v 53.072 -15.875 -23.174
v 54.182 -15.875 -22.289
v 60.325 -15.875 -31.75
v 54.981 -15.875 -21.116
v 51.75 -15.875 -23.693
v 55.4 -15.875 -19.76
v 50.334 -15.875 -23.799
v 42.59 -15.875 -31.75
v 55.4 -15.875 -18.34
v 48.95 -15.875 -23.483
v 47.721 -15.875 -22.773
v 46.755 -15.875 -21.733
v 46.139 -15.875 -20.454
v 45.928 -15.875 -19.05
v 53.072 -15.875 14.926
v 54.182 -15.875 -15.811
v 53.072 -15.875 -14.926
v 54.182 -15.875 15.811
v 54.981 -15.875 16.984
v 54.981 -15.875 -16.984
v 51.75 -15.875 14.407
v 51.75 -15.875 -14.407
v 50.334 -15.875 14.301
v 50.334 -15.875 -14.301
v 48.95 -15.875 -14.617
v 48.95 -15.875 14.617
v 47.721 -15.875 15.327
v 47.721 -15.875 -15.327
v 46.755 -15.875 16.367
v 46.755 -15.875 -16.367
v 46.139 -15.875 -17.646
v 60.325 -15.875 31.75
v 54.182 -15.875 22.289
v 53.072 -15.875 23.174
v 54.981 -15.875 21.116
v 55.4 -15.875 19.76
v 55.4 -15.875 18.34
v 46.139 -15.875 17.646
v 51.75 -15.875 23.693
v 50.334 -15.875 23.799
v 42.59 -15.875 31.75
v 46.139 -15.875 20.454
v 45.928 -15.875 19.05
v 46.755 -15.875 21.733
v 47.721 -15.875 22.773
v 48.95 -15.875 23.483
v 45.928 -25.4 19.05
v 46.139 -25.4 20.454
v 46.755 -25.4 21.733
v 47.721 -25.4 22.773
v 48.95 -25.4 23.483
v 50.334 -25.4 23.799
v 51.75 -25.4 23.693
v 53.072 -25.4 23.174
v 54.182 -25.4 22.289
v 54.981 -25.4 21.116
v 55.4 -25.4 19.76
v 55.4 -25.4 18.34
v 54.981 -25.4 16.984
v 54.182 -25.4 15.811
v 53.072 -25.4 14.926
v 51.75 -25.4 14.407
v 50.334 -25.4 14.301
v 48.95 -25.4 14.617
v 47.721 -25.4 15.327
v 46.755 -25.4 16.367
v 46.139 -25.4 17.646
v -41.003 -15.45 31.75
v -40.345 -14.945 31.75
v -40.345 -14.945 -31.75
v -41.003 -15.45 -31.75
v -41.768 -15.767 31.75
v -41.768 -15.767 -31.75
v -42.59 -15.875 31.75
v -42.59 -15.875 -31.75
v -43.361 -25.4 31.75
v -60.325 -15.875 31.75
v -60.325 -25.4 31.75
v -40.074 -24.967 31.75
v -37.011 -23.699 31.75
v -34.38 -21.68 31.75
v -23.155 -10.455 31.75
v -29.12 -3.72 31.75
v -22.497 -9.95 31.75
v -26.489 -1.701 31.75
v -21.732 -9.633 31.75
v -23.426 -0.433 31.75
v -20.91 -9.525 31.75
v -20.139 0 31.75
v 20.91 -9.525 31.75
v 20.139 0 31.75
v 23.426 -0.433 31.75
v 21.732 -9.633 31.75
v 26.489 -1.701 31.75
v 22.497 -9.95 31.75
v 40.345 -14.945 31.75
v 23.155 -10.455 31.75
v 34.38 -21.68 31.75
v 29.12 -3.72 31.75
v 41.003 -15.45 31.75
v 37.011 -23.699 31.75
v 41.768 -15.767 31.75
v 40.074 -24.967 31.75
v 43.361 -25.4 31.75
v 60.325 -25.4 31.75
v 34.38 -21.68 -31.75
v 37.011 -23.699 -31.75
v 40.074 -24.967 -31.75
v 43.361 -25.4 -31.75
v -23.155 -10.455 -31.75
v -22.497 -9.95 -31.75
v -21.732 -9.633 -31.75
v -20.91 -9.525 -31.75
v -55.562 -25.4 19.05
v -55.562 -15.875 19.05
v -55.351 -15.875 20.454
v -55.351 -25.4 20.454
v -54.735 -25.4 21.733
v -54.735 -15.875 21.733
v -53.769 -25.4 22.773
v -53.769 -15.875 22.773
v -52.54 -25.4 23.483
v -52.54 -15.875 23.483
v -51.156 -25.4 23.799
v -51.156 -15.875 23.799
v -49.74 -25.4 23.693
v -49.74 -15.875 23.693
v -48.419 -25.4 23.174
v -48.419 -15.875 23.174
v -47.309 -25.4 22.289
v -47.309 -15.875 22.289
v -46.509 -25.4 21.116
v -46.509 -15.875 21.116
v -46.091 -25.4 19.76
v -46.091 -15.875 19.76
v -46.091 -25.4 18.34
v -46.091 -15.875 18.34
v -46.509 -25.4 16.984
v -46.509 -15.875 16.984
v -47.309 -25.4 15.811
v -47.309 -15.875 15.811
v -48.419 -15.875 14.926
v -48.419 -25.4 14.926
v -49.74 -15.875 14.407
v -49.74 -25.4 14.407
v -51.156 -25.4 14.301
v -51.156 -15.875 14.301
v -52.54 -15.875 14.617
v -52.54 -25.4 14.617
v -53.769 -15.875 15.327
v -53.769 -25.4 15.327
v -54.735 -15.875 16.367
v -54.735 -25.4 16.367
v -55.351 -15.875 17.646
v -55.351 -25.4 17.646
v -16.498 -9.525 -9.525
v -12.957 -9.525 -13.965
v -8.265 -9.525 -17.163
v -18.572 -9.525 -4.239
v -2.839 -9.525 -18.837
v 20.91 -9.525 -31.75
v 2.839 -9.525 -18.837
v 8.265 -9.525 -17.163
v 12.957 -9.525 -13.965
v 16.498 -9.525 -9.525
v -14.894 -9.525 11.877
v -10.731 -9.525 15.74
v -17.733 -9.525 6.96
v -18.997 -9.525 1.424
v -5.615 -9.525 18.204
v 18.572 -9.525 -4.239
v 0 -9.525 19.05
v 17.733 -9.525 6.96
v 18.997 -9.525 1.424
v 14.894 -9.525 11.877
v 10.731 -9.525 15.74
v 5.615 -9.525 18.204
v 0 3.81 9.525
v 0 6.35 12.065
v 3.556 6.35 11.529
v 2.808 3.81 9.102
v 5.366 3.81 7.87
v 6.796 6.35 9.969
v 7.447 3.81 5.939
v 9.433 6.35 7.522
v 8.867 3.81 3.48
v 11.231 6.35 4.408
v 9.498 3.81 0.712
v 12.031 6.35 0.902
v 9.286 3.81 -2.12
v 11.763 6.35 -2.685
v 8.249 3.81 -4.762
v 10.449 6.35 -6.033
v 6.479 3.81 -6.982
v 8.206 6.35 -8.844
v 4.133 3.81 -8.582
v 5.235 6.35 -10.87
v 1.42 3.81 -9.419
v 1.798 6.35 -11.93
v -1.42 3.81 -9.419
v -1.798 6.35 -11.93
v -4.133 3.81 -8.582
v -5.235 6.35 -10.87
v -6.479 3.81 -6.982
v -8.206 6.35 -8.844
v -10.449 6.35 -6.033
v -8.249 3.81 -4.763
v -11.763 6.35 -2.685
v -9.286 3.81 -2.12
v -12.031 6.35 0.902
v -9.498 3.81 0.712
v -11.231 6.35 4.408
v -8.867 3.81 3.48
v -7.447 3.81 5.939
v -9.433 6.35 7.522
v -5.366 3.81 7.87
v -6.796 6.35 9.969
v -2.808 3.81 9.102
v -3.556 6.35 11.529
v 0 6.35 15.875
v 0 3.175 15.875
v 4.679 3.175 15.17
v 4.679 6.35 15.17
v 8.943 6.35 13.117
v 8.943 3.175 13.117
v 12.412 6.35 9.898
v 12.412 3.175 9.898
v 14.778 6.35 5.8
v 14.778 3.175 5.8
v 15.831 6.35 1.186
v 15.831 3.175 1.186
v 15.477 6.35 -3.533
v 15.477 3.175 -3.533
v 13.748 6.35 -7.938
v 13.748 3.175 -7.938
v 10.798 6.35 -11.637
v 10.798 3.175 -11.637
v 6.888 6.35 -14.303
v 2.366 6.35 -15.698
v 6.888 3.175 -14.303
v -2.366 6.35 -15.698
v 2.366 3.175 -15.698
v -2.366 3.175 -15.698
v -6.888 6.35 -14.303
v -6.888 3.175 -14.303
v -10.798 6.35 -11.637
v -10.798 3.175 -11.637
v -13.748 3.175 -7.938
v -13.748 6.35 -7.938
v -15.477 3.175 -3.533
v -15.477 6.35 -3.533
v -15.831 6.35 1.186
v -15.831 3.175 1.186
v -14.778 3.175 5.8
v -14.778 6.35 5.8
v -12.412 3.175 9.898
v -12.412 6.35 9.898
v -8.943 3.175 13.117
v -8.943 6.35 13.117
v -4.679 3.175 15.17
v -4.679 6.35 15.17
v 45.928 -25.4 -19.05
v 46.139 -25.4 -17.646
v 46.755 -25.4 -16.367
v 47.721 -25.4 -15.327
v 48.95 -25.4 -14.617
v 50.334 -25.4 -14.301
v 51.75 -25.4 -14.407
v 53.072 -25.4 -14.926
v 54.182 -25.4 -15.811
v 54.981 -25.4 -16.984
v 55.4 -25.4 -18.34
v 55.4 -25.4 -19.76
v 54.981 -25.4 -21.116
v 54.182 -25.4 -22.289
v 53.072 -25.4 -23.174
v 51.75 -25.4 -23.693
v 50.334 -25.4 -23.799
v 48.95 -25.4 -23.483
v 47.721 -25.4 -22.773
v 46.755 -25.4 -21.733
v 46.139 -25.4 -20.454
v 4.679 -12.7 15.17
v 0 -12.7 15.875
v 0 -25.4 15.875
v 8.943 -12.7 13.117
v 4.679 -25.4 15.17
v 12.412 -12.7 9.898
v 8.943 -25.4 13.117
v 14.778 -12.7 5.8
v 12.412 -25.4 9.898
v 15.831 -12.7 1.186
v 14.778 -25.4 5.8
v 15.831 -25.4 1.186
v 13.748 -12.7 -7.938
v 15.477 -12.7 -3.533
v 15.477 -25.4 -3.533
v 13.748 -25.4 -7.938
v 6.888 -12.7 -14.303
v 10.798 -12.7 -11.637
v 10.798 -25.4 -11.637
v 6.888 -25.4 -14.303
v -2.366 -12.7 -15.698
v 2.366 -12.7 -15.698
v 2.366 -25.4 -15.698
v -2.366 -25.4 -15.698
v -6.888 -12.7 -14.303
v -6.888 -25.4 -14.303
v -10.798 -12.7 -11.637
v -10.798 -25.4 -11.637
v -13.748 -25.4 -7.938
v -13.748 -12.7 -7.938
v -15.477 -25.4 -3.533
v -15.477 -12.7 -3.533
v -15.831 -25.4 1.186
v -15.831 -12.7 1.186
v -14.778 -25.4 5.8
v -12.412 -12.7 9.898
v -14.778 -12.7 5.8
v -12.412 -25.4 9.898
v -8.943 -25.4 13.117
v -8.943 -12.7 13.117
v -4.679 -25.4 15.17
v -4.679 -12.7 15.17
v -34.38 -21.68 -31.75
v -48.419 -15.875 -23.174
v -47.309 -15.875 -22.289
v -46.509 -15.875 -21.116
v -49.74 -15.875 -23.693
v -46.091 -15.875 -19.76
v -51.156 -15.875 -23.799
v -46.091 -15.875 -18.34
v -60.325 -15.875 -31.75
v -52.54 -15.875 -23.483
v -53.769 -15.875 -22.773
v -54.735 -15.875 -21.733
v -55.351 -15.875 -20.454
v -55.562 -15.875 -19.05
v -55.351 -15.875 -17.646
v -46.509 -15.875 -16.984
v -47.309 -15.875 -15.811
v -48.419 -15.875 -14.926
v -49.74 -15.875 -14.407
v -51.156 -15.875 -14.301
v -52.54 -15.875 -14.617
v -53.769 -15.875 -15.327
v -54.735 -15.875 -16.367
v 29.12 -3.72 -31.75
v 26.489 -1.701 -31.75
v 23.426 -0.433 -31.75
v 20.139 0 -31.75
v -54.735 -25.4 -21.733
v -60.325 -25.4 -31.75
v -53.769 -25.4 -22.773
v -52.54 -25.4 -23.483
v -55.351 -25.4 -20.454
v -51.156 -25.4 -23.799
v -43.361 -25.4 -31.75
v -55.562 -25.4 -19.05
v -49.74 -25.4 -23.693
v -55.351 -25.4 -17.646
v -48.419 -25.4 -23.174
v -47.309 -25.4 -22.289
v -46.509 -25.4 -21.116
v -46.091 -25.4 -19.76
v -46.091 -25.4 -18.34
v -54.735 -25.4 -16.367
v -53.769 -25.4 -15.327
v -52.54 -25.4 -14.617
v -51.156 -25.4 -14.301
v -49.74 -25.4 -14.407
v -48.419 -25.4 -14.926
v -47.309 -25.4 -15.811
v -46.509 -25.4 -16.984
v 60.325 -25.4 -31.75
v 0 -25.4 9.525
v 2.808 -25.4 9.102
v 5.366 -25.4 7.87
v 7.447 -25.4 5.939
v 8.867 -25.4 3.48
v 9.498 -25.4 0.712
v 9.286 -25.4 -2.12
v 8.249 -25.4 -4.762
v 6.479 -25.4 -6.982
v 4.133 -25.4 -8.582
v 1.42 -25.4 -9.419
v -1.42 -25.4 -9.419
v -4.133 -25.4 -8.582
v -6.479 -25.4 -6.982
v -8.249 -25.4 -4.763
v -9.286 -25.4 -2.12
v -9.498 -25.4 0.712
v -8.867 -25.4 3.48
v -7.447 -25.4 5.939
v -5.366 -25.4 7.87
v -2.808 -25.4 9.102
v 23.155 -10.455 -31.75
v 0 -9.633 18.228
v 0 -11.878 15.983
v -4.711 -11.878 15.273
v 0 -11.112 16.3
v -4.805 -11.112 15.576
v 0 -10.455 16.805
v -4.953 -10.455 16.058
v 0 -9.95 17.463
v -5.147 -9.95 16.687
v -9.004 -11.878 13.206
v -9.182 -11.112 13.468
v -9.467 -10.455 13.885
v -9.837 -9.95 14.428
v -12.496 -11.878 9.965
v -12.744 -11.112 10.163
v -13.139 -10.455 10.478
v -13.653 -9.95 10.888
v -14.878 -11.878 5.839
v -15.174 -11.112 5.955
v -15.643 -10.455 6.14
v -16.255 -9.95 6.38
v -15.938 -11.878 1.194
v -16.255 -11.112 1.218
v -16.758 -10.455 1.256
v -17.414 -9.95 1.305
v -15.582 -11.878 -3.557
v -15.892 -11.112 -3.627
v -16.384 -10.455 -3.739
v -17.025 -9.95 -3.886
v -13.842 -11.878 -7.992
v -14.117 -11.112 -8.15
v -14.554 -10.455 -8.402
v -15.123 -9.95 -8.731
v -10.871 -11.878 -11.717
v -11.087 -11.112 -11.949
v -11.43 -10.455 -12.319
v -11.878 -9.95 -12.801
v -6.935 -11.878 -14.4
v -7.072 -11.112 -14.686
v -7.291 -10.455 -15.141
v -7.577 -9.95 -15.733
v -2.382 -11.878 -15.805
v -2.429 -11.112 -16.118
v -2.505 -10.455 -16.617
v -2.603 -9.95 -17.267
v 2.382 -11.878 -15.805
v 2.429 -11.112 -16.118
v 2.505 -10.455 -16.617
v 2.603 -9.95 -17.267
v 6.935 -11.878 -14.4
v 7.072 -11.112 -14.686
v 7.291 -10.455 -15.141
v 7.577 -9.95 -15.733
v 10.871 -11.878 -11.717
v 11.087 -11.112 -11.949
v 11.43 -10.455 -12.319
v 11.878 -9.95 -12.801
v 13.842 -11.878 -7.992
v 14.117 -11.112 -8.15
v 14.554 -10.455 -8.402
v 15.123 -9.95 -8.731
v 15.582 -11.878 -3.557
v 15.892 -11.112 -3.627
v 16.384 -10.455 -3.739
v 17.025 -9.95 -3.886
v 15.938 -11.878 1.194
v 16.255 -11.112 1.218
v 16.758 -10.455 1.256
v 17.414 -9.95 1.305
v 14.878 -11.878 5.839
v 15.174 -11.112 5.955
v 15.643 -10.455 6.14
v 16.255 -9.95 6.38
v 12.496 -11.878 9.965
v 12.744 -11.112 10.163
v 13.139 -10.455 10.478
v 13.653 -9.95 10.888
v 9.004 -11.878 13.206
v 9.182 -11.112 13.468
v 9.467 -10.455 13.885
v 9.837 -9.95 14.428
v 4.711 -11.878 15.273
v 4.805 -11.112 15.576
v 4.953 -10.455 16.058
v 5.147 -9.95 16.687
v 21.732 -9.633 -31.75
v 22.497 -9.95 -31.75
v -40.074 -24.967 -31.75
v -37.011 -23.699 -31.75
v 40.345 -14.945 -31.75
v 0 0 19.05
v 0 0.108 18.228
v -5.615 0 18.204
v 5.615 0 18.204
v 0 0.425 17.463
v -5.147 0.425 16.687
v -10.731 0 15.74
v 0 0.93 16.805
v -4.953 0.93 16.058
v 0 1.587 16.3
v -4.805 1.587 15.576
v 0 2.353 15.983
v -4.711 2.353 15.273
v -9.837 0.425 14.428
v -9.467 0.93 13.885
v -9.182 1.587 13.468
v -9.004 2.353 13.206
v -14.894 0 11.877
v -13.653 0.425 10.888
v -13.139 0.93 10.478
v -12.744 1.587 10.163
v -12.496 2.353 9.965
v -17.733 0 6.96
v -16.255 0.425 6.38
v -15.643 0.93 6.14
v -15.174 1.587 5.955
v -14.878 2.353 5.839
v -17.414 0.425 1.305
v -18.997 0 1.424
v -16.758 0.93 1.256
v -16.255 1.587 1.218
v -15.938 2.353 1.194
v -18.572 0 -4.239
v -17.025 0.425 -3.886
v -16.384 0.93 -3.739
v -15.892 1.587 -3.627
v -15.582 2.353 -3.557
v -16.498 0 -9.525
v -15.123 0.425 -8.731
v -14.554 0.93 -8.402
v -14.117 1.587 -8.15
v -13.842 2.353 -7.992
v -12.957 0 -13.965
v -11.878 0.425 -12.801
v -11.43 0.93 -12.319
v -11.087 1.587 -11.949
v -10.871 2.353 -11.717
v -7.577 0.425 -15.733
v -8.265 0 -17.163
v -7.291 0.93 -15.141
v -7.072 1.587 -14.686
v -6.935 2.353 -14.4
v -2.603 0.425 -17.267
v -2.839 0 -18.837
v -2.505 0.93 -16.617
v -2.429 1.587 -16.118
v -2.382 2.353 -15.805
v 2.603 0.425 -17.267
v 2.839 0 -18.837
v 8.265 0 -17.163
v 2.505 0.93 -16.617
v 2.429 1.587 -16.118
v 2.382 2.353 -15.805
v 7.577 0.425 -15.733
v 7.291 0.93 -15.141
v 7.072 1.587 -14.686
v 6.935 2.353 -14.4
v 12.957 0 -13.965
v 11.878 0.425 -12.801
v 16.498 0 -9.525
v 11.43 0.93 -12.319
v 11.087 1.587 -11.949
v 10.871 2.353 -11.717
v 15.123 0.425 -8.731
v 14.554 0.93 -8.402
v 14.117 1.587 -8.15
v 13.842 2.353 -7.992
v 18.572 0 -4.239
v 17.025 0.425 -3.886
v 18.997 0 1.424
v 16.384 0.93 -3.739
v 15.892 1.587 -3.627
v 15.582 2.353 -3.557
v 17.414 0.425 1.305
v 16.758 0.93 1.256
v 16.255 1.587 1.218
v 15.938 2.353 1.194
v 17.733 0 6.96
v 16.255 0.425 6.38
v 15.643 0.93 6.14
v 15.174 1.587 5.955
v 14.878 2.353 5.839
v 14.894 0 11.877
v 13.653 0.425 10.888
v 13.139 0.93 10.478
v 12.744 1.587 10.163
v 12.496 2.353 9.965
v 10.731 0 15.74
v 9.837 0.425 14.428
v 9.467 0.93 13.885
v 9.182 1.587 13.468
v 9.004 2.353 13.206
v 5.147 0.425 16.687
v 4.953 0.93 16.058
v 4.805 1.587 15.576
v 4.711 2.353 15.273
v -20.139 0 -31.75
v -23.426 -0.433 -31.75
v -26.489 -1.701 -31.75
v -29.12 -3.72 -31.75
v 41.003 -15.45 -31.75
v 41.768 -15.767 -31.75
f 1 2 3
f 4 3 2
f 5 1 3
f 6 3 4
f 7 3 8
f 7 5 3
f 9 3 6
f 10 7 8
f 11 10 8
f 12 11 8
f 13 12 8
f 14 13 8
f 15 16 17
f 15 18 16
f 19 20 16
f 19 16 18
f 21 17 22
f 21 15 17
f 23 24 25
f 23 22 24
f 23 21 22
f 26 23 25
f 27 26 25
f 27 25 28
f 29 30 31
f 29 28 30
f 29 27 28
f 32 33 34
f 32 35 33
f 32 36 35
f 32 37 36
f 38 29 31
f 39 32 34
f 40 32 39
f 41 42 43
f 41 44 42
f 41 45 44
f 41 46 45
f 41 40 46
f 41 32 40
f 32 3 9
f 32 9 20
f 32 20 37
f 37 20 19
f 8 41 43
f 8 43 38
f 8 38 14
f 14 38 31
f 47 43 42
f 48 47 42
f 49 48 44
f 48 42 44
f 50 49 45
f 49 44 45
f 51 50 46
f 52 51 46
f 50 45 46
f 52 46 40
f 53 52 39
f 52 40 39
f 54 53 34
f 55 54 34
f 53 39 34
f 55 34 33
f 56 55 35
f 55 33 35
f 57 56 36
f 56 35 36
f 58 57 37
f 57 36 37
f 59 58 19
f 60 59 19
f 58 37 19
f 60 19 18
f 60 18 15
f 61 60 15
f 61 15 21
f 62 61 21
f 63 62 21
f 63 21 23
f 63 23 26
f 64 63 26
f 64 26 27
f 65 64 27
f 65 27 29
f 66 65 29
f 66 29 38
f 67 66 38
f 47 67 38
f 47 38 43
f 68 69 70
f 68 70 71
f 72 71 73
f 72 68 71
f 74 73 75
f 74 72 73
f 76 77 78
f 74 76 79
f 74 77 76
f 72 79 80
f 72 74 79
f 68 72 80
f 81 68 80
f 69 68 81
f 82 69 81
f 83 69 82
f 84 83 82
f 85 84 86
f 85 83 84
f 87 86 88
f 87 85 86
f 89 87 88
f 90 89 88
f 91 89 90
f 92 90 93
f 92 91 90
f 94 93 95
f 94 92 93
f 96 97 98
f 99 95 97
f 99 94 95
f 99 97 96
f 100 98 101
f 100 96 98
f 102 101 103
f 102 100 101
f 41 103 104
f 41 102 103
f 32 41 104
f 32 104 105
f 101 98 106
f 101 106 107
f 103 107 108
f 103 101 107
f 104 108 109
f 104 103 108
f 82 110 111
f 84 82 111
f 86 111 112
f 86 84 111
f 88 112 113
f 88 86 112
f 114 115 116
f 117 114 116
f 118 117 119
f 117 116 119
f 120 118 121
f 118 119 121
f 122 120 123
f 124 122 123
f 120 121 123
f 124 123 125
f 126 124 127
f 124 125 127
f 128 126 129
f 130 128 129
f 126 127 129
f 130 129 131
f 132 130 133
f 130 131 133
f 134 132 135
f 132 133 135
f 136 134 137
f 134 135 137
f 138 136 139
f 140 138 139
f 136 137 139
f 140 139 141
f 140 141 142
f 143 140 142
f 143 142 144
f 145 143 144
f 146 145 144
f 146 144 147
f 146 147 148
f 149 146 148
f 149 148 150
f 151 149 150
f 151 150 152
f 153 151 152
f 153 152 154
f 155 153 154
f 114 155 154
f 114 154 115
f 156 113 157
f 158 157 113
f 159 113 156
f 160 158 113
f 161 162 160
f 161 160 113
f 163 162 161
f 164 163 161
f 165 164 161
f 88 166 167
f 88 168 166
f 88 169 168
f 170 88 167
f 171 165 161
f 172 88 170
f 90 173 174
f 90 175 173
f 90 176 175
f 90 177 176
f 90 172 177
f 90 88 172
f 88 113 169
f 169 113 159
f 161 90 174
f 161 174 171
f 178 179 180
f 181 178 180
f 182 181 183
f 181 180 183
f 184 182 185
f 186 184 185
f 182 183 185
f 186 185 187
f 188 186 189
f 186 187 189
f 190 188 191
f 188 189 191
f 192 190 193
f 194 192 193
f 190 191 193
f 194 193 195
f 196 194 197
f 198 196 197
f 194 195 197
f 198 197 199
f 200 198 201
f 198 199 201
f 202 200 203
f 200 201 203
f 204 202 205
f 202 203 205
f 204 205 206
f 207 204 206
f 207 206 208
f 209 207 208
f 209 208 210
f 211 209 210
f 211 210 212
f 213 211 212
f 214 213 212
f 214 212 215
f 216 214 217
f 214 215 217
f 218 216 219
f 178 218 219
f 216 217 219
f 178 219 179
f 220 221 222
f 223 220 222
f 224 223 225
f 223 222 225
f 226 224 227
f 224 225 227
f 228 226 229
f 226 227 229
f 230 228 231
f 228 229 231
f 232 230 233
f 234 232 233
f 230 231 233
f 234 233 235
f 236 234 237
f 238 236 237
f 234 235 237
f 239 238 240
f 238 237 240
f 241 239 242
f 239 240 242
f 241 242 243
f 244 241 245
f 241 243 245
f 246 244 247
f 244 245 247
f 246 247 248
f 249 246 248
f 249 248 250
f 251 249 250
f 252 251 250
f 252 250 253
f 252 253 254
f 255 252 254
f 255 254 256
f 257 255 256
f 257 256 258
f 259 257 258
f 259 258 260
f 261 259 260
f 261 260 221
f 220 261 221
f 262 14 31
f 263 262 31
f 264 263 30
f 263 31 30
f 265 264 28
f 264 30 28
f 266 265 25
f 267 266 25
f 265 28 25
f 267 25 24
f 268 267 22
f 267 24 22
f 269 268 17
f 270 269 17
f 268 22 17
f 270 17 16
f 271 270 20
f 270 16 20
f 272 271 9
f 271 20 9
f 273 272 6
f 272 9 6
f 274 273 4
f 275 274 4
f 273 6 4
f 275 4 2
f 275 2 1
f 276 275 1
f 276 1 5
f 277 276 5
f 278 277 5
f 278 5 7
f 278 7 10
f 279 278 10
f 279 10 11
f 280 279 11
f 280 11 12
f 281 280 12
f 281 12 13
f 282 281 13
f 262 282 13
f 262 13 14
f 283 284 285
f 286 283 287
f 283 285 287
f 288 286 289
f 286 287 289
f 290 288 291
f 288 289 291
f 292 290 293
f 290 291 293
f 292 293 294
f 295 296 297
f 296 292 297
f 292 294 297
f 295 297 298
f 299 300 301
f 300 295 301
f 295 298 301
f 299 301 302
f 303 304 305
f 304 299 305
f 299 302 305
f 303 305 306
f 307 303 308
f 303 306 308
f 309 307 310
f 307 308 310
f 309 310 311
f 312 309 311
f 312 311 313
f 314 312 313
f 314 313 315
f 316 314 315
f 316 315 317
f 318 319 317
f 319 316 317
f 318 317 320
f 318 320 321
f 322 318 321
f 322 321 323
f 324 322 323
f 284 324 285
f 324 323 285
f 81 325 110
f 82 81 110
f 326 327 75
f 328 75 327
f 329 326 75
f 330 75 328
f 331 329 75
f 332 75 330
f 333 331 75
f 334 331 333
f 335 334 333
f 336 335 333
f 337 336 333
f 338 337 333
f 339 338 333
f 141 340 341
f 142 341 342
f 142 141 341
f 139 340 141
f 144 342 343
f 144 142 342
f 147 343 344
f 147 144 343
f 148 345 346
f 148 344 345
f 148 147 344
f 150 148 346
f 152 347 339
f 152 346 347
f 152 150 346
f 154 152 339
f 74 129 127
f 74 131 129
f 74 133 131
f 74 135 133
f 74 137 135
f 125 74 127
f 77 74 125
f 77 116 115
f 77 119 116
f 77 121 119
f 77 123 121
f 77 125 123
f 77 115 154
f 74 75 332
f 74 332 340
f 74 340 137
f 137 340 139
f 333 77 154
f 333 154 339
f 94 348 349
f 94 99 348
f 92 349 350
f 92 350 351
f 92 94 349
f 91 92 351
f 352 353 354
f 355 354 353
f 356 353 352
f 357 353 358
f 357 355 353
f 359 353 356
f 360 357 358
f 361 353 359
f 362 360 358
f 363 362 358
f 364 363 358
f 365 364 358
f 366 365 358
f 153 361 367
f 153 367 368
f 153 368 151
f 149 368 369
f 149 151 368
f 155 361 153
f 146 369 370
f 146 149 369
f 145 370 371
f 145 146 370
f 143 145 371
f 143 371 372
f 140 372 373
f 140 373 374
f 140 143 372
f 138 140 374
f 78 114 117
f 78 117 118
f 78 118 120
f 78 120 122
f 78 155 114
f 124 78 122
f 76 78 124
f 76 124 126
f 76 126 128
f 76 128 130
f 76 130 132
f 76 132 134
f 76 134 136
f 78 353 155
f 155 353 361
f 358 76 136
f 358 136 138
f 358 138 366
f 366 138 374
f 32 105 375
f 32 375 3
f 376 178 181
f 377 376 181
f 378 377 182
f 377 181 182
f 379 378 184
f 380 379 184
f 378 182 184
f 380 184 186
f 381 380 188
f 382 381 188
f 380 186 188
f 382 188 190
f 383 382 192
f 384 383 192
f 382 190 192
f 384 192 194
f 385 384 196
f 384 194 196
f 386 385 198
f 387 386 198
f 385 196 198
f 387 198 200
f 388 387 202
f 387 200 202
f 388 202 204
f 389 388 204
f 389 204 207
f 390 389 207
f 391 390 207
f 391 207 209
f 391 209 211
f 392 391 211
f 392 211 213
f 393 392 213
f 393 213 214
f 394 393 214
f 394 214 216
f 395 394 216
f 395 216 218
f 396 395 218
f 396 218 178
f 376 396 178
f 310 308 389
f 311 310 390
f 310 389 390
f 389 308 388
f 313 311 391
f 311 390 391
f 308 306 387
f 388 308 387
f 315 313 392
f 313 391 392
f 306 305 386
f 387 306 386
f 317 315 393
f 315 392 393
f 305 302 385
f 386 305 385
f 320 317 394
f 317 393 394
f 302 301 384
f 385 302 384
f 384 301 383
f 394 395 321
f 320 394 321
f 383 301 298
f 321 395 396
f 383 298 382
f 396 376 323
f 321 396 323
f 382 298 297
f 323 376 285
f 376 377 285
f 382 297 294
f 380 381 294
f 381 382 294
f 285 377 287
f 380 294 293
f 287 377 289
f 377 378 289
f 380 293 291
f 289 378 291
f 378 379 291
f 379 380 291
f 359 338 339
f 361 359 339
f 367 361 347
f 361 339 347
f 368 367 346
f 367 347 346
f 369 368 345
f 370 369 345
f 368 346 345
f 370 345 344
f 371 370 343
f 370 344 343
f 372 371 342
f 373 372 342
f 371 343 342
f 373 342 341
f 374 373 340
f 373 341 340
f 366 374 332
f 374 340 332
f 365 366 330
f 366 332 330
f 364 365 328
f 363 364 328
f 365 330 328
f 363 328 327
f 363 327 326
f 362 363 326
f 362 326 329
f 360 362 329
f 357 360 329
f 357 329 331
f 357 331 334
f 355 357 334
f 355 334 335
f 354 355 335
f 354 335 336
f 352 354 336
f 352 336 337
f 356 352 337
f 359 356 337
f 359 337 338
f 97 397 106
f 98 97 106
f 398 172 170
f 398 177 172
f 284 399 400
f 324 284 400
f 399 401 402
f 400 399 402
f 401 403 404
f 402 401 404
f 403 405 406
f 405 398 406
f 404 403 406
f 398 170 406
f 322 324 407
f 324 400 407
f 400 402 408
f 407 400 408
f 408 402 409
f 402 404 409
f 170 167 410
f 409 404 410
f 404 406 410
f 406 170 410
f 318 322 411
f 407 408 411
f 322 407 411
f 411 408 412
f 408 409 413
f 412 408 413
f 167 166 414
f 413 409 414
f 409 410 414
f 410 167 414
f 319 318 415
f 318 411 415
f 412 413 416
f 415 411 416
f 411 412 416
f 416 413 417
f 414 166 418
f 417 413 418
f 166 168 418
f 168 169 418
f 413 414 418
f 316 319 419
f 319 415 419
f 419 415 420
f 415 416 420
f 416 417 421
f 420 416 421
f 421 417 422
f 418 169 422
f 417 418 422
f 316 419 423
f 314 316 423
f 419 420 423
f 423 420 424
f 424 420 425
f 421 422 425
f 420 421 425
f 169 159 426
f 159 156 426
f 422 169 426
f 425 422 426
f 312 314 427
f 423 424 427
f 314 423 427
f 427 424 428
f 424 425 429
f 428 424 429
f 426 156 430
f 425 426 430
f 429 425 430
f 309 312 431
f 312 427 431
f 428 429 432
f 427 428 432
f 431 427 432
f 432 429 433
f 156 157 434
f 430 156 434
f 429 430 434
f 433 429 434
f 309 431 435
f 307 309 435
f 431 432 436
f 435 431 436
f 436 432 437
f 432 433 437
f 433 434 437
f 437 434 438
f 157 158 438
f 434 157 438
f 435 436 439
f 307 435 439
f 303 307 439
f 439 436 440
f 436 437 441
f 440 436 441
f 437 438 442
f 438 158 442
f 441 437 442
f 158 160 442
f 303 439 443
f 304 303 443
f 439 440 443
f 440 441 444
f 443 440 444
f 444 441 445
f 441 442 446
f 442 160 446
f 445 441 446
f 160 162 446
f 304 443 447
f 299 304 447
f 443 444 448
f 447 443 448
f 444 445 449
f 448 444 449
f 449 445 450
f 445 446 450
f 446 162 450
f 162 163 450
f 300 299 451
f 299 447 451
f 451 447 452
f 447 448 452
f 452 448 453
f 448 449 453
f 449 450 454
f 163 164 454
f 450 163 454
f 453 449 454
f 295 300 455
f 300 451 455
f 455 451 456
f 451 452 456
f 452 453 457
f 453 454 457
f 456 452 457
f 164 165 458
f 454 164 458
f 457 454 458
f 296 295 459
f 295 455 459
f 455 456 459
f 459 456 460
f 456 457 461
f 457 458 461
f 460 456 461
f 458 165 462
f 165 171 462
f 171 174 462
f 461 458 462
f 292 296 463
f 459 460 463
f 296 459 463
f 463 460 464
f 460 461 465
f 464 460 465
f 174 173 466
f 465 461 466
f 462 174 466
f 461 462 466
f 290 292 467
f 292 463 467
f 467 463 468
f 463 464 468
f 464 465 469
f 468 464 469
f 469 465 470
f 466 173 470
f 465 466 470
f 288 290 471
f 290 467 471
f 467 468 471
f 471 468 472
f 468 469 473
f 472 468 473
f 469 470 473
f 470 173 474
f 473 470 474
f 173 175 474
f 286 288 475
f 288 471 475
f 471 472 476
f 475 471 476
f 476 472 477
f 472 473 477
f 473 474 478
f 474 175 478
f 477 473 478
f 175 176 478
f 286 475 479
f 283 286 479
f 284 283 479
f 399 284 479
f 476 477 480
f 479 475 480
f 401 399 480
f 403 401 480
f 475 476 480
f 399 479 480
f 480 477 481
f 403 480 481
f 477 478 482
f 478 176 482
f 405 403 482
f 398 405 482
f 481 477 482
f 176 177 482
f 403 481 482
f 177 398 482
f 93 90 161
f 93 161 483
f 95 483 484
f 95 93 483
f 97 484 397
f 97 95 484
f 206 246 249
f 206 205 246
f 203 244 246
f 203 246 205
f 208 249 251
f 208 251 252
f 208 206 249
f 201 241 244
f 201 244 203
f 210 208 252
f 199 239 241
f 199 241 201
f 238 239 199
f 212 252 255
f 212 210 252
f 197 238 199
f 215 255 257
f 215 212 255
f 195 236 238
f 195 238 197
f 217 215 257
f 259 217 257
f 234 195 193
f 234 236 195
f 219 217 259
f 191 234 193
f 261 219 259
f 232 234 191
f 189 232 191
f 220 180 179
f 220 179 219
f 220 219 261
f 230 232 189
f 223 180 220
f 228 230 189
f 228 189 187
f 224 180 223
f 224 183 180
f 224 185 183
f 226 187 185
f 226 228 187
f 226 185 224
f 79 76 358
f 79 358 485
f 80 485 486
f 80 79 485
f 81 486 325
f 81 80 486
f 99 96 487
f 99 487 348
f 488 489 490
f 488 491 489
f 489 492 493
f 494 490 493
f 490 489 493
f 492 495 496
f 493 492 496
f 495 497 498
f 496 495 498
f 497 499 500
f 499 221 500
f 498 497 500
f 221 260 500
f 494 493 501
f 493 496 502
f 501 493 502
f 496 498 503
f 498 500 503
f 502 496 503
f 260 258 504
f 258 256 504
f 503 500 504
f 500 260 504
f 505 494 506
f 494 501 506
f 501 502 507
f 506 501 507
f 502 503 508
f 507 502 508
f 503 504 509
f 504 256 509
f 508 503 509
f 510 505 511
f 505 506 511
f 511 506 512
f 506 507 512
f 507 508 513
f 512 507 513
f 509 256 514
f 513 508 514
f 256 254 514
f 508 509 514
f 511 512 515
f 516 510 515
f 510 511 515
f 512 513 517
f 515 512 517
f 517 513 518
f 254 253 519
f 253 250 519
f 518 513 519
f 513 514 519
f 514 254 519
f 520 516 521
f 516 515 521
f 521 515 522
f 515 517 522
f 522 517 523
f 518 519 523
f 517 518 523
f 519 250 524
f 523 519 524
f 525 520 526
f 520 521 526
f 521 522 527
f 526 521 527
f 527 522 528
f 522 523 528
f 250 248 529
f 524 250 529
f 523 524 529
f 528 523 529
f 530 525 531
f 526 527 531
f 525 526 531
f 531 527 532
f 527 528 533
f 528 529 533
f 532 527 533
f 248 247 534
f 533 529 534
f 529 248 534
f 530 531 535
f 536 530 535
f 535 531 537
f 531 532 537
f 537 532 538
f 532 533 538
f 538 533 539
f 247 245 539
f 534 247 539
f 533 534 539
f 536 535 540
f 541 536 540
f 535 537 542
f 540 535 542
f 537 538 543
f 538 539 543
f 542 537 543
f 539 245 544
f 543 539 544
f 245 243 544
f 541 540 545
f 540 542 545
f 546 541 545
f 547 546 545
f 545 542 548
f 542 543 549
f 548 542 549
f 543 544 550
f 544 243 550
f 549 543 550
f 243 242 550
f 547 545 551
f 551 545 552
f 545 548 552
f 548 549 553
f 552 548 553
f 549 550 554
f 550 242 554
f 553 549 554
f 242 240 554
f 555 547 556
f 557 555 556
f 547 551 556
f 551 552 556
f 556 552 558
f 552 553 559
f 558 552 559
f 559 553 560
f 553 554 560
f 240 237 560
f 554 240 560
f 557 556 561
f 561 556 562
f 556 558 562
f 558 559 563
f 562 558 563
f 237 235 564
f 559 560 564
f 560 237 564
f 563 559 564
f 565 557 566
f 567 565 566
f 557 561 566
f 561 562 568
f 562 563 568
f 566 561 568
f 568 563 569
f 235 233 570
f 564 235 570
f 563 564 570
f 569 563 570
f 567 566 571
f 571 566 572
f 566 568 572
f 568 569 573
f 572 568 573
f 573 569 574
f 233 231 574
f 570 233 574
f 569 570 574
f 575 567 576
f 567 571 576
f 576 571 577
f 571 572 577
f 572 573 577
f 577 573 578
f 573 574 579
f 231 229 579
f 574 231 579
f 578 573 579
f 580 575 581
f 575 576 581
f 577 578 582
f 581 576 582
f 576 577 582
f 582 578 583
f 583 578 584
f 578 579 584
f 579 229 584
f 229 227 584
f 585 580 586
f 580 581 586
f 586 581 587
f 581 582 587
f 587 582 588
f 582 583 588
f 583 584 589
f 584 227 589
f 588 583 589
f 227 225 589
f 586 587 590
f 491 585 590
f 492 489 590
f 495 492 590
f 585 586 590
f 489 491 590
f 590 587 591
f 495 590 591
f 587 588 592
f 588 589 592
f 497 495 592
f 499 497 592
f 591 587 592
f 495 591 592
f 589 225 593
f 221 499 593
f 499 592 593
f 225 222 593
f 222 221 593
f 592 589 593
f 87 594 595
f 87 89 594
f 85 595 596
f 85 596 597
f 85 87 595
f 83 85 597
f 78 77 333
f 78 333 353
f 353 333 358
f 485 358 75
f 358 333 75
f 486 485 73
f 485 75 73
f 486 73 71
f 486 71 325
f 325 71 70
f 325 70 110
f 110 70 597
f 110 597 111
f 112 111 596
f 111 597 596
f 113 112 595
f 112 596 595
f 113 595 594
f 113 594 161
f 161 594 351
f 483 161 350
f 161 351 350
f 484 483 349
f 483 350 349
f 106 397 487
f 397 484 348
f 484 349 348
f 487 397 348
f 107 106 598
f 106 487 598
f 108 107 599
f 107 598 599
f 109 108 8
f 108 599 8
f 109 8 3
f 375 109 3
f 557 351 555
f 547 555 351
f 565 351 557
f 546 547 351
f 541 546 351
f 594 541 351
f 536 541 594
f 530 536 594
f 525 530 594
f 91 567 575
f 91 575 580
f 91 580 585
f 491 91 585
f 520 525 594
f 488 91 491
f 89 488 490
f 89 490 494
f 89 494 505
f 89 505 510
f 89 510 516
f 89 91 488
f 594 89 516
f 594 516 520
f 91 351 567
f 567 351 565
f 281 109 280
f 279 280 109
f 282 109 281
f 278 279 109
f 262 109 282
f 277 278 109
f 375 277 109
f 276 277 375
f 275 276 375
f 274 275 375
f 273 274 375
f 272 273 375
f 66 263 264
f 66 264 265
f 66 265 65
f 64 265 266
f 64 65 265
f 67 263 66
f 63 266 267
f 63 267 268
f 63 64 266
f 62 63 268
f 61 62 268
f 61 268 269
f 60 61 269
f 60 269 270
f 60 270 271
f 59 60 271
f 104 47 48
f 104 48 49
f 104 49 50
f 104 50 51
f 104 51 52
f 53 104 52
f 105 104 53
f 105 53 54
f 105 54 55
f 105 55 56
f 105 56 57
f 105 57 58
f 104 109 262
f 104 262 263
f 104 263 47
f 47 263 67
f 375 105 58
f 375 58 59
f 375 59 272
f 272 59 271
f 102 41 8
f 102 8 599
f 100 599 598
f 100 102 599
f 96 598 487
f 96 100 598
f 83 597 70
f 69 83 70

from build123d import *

# Parameters (mm, degrees)
BASE_DEPTH            = 31.75
ROUND_BOSS_DEPTH      = 6.35
ROUND_BOSS_DEPTH_BACK = 25.4
SKETCH2_R             = 15.875
SKETCH3_R             = 9.525
CENTER_HOLE_DEPTH     = 76.201267443
FILLET1_R             = 3.175
CHAMFER1_SIZE         = 2.54
SKETCH4_R             = 4.7625
RIVET_HOLES_DEPTH     = 72.701595171


with BuildPart() as part:
    # Sketch1 → Base (new, symmetric)
    with BuildSketch(Plane.XY):
        with BuildLine():
            Line((0, 0), (-20.139487758, 0))
            ThreePointArc((-20.139487758, 0), (-24.999567349, -0.966729937), (-29.119743879, -3.719743879))
            Line((-29.119743879, -3.719743879), (-40.34506403, -14.94506403))
            ThreePointArc((-40.34506403, -14.94506403), (-41.375108163, -15.633317516), (-42.590128061, -15.875))
            Line((-42.590128061, -15.875), (-60.325, -15.875))
            Line((-60.325, -15.875), (-60.325, -25.4))
            Line((-60.325, -25.4), (-43.360512242, -25.4))
            ThreePointArc((-43.360512242, -25.4), (-38.500432651, -24.433270063), (-34.380256121, -21.680256121))
            Line((-34.380256121, -21.680256121), (-23.15493597, -10.45493597))
            ThreePointArc((-23.15493597, -10.45493597), (-22.124891837, -9.766682484), (-20.909871939, -9.525))
            Line((-20.909871939, -9.525), (0, -9.525))
            Line((0, -9.525), (0, 0))
        make_face()
        with BuildLine():
            Line((20.139487758, 0), (0, 0))
            Line((0, 0), (0, -9.525))
            Line((0, -9.525), (20.909871939, -9.525))
            ThreePointArc((20.909871939, -9.525), (22.124891837, -9.766682484), (23.15493597, -10.45493597))
            Line((23.15493597, -10.45493597), (34.380256121, -21.680256121))
            ThreePointArc((34.380256121, -21.680256121), (38.500432651, -24.433270063), (43.360512242, -25.4))
            Line((43.360512242, -25.4), (60.325, -25.4))
            Line((60.325, -25.4), (60.325, -15.875))
            Line((60.325, -15.875), (42.590128061, -15.875))
            ThreePointArc((42.590128061, -15.875), (41.375108163, -15.633317516), (40.34506403, -14.94506403))
            Line((40.34506403, -14.94506403), (29.119743879, -3.719743879))
            ThreePointArc((29.119743879, -3.719743879), (24.999567349, -0.966729937), (20.139487758, 0))
        make_face()
    extrude(amount=BASE_DEPTH, both=True)

    # Sketch2 → Round Boss (add, two sides: drawn at the far end of the back side and taken through both)
    with BuildSketch(Plane(origin=(0, 0, 0), x_dir=(1, 0, 0), z_dir=(0, 1, 0)).offset(-ROUND_BOSS_DEPTH_BACK)):
        with Locations(Location((0, 0, 0), (0, 0, 270))):
            Circle(SKETCH2_R)
    extrude(amount=ROUND_BOSS_DEPTH + ROUND_BOSS_DEPTH_BACK)

    # Sketch3 → Center Hole (cut, through all)
    with BuildSketch(Plane(origin=(0, 6.35, 0), x_dir=(1, 0, 0), z_dir=(0, 1, 0))):
        with Locations(Location((0, 0, 0), (0, 0, 270))):
            Circle(SKETCH3_R)
    extrude(amount=-CENTER_HOLE_DEPTH, mode=Mode.SUBTRACT)

    # Fillet1
    fillet1_edges = [part.edges().sort_by_distance(p)[0] for p in [
        (0, 0, -15.875),
        (0, -9.525, -15.875),
    ]]
    fillet(fillet1_edges, radius=FILLET1_R)

    # Chamfer1
    chamfer1_edges = [part.edges().sort_by_distance(p)[0] for p in [
        (0, 6.35, -9.525),
    ]]
    chamfer(chamfer1_edges, length=CHAMFER1_SIZE)

    # Sketch4 → Rivet Holes (cut, through all)
    with BuildSketch(Plane(origin=(0, -15.875, 0), x_dir=(1, 0, 0), z_dir=(0, 1, 0))):
        with Locations(Location((-50.8, 19.05, 0), (0, 0, 180))):
            Circle(SKETCH4_R)
        with Locations(Location((-50.8, -19.05, 0), (0, 0, 180))):
            Circle(SKETCH4_R)
        with Locations(Location((50.690390268, -19.05, 0), (0, 0, 180))):
            Circle(SKETCH4_R)
        with Locations(Location((50.690390268, 19.05, 0), (0, 0, 180))):
            Circle(SKETCH4_R)
    extrude(amount=-RIVET_HOLES_DEPTH, mode=Mode.SUBTRACT)


solid = part.part
